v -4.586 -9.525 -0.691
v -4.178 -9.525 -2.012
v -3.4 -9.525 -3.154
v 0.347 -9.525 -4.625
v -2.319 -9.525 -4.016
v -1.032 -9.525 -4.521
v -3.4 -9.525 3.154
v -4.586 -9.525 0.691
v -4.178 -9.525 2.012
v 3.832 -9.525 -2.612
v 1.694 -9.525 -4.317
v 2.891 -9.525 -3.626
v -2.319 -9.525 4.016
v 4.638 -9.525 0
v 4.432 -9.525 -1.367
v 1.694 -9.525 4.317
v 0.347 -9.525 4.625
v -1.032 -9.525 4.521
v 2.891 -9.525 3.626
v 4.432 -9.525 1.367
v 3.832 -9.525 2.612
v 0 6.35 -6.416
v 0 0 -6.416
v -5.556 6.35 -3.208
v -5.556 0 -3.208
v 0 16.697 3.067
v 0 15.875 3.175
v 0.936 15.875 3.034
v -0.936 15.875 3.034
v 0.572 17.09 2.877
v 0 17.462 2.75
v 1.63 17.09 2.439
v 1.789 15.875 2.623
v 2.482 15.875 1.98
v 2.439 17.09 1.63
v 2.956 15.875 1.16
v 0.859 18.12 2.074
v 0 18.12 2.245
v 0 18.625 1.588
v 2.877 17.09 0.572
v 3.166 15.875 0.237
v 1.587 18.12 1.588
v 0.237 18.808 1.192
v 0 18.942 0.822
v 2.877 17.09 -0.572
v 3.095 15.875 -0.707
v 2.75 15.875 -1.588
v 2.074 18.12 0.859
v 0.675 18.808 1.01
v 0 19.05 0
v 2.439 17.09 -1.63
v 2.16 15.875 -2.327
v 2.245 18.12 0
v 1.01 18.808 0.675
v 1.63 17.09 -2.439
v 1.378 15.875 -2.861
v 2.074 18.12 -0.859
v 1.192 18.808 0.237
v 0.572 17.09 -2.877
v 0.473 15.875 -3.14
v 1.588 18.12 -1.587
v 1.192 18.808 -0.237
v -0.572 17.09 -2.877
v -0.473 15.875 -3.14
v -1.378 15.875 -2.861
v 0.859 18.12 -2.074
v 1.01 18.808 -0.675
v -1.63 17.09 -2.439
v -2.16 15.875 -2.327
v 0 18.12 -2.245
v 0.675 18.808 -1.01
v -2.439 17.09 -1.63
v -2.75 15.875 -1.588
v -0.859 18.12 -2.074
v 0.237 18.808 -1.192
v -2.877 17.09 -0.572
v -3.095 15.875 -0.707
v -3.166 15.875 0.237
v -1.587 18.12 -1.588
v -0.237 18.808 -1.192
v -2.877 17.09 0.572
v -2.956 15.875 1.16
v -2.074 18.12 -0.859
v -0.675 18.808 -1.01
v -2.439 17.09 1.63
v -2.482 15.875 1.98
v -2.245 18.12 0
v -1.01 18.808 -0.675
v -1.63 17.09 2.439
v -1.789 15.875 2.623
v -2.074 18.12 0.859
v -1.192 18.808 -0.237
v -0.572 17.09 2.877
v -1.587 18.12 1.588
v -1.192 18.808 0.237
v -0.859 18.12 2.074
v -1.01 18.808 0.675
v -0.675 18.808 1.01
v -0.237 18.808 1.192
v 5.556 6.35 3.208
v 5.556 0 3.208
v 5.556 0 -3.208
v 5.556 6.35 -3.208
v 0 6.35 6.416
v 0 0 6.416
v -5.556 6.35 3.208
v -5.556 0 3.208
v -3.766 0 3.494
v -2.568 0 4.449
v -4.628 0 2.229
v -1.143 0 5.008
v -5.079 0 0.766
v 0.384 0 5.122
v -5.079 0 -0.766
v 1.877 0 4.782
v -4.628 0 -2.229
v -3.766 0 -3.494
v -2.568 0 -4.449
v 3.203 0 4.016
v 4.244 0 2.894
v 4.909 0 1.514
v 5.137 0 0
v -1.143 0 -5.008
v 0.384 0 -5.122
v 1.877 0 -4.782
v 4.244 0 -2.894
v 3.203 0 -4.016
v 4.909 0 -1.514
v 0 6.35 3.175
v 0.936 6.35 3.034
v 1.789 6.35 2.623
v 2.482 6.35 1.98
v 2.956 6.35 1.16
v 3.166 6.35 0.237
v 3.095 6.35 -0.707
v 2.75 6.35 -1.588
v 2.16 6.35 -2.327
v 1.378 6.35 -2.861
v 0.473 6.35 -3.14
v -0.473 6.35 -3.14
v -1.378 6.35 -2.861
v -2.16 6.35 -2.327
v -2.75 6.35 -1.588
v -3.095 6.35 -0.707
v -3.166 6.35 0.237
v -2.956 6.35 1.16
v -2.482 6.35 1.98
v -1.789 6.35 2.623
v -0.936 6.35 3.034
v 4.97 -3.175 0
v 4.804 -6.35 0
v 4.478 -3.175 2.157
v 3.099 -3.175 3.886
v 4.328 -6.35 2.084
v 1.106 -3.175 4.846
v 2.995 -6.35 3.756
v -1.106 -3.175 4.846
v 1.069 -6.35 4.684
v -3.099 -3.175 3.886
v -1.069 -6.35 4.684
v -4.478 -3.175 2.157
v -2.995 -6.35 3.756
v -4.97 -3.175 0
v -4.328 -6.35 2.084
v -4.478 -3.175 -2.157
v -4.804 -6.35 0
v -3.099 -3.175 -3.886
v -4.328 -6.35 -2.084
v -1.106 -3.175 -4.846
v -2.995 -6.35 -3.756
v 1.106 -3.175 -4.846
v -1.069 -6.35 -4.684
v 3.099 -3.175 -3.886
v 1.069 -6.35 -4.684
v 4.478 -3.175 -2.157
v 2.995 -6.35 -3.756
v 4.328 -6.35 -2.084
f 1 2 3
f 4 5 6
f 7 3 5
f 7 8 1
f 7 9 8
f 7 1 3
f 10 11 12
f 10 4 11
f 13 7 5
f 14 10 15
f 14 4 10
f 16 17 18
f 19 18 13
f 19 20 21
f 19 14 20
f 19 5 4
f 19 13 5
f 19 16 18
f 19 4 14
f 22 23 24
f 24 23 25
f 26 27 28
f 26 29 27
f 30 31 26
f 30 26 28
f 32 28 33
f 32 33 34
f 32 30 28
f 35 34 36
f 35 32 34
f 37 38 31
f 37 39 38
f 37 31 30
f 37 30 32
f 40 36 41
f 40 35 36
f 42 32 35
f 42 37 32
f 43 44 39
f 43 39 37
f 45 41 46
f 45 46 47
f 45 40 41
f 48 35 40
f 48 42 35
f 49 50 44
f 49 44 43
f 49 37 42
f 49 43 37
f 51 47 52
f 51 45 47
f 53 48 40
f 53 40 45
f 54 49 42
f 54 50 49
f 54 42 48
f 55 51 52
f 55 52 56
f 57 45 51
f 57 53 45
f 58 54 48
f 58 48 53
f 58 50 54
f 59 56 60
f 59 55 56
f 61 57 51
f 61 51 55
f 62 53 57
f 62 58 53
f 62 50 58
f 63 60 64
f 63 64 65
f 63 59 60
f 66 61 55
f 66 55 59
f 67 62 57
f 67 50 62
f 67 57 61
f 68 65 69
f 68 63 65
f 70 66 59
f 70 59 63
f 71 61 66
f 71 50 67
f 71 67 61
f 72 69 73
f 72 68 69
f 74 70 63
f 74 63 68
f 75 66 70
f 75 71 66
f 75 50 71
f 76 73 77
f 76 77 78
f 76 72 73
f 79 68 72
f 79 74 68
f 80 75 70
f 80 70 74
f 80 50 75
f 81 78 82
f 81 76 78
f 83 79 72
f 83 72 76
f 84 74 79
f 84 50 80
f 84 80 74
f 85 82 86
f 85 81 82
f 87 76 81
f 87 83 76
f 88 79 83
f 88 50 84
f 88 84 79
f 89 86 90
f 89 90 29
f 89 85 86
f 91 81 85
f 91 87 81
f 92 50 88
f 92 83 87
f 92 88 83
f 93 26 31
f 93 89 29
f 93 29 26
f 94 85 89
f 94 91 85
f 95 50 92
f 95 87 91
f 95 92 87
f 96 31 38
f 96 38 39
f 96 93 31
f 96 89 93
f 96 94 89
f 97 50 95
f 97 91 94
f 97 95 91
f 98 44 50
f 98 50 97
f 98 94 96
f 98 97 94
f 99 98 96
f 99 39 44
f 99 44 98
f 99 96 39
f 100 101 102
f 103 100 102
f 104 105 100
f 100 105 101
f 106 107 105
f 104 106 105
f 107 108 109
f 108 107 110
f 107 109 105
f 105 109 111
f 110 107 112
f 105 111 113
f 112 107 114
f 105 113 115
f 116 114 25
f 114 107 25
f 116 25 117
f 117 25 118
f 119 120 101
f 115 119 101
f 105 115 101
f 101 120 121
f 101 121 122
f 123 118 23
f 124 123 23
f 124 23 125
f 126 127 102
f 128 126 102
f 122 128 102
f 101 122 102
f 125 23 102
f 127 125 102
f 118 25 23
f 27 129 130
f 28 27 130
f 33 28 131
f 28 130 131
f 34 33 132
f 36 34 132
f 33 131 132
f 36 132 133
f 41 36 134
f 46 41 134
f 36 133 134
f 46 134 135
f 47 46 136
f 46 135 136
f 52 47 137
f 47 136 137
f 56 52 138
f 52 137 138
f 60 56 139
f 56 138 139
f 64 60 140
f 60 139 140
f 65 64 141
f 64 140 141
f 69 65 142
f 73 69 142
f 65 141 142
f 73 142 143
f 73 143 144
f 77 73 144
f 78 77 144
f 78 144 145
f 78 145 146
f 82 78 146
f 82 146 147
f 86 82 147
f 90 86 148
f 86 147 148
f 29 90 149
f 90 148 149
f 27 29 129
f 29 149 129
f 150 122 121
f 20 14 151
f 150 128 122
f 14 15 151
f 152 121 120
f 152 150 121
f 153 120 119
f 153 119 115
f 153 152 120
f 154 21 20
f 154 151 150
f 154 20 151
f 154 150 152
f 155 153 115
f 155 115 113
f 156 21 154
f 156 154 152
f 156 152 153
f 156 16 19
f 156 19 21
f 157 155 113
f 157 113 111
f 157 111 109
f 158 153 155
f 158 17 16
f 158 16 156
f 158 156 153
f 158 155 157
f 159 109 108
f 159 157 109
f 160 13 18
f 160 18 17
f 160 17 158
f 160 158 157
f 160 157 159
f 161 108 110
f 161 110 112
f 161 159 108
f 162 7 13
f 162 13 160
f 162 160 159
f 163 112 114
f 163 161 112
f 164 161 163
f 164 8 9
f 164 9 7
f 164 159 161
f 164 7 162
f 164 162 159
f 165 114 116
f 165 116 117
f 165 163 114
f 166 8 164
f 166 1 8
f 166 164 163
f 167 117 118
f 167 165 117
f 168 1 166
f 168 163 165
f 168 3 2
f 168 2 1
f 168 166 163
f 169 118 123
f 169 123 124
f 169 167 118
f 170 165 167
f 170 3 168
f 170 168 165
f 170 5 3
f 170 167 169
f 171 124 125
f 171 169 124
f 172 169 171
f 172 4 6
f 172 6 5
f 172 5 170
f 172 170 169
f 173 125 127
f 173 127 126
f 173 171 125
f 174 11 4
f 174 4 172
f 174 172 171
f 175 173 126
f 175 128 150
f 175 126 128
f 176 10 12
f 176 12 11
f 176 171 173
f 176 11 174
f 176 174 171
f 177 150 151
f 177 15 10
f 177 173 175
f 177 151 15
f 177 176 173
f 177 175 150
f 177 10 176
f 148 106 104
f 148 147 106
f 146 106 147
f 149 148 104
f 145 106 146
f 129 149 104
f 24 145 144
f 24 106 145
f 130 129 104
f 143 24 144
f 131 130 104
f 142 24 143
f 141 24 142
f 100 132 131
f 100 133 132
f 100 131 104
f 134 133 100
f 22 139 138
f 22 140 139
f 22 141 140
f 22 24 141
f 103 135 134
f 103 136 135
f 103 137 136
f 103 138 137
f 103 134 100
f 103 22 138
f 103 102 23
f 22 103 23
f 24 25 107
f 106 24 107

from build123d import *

# Parameters (mm, degrees)
BOSS_EXTRUDE1_DEPTH = 6.35
SKETCH3_R           = 3.175
BOSS_EXTRUDE2_DEPTH = 12.7
FILLET1_R           = 3.175
SKETCH4_R           = 5.136753641
BOSS_EXTRUDE3_DEPTH = 9.525
BOSS_EXTRUDE3_TAPER = 3


with BuildPart() as part:
    # Sketch1 → Boss-Extrude1 (new body)
    with BuildSketch(Plane(origin=(0, 0, 0), x_dir=(1, 0, 0), z_dir=(0, 1, 0))):
        Polygon((5.55625, 3.207902433), (0, 6.415804866), (-5.55625, 3.207902433), (-5.55625, -3.207902433), (0, -6.415804866), (5.55625, -3.207902433), align=None)
    extrude(amount=BOSS_EXTRUDE1_DEPTH)

    # Sketch3 → Boss-Extrude2 (add)
    with BuildSketch(Plane(origin=(0, 6.35, 0), x_dir=(1, 0, 0), z_dir=(0, 1, 0))):
        with Locations(Location((0, 0, 0), (0, 0, 270))):
            Circle(SKETCH3_R)
    extrude(amount=BOSS_EXTRUDE2_DEPTH)

    # Fillet1
    fillet1_edges = [part.edges().sort_by_distance(p)[0] for p in [
        (0, 19.05, -3.175),
    ]]
    fillet(fillet1_edges, radius=FILLET1_R)

    # Sketch4 → Boss-Extrude3 (add)
    with BuildSketch(Plane.XZ):
        Circle(SKETCH4_R)
    extrude(amount=BOSS_EXTRUDE3_DEPTH, taper=BOSS_EXTRUDE3_TAPER)


solid = part.part
